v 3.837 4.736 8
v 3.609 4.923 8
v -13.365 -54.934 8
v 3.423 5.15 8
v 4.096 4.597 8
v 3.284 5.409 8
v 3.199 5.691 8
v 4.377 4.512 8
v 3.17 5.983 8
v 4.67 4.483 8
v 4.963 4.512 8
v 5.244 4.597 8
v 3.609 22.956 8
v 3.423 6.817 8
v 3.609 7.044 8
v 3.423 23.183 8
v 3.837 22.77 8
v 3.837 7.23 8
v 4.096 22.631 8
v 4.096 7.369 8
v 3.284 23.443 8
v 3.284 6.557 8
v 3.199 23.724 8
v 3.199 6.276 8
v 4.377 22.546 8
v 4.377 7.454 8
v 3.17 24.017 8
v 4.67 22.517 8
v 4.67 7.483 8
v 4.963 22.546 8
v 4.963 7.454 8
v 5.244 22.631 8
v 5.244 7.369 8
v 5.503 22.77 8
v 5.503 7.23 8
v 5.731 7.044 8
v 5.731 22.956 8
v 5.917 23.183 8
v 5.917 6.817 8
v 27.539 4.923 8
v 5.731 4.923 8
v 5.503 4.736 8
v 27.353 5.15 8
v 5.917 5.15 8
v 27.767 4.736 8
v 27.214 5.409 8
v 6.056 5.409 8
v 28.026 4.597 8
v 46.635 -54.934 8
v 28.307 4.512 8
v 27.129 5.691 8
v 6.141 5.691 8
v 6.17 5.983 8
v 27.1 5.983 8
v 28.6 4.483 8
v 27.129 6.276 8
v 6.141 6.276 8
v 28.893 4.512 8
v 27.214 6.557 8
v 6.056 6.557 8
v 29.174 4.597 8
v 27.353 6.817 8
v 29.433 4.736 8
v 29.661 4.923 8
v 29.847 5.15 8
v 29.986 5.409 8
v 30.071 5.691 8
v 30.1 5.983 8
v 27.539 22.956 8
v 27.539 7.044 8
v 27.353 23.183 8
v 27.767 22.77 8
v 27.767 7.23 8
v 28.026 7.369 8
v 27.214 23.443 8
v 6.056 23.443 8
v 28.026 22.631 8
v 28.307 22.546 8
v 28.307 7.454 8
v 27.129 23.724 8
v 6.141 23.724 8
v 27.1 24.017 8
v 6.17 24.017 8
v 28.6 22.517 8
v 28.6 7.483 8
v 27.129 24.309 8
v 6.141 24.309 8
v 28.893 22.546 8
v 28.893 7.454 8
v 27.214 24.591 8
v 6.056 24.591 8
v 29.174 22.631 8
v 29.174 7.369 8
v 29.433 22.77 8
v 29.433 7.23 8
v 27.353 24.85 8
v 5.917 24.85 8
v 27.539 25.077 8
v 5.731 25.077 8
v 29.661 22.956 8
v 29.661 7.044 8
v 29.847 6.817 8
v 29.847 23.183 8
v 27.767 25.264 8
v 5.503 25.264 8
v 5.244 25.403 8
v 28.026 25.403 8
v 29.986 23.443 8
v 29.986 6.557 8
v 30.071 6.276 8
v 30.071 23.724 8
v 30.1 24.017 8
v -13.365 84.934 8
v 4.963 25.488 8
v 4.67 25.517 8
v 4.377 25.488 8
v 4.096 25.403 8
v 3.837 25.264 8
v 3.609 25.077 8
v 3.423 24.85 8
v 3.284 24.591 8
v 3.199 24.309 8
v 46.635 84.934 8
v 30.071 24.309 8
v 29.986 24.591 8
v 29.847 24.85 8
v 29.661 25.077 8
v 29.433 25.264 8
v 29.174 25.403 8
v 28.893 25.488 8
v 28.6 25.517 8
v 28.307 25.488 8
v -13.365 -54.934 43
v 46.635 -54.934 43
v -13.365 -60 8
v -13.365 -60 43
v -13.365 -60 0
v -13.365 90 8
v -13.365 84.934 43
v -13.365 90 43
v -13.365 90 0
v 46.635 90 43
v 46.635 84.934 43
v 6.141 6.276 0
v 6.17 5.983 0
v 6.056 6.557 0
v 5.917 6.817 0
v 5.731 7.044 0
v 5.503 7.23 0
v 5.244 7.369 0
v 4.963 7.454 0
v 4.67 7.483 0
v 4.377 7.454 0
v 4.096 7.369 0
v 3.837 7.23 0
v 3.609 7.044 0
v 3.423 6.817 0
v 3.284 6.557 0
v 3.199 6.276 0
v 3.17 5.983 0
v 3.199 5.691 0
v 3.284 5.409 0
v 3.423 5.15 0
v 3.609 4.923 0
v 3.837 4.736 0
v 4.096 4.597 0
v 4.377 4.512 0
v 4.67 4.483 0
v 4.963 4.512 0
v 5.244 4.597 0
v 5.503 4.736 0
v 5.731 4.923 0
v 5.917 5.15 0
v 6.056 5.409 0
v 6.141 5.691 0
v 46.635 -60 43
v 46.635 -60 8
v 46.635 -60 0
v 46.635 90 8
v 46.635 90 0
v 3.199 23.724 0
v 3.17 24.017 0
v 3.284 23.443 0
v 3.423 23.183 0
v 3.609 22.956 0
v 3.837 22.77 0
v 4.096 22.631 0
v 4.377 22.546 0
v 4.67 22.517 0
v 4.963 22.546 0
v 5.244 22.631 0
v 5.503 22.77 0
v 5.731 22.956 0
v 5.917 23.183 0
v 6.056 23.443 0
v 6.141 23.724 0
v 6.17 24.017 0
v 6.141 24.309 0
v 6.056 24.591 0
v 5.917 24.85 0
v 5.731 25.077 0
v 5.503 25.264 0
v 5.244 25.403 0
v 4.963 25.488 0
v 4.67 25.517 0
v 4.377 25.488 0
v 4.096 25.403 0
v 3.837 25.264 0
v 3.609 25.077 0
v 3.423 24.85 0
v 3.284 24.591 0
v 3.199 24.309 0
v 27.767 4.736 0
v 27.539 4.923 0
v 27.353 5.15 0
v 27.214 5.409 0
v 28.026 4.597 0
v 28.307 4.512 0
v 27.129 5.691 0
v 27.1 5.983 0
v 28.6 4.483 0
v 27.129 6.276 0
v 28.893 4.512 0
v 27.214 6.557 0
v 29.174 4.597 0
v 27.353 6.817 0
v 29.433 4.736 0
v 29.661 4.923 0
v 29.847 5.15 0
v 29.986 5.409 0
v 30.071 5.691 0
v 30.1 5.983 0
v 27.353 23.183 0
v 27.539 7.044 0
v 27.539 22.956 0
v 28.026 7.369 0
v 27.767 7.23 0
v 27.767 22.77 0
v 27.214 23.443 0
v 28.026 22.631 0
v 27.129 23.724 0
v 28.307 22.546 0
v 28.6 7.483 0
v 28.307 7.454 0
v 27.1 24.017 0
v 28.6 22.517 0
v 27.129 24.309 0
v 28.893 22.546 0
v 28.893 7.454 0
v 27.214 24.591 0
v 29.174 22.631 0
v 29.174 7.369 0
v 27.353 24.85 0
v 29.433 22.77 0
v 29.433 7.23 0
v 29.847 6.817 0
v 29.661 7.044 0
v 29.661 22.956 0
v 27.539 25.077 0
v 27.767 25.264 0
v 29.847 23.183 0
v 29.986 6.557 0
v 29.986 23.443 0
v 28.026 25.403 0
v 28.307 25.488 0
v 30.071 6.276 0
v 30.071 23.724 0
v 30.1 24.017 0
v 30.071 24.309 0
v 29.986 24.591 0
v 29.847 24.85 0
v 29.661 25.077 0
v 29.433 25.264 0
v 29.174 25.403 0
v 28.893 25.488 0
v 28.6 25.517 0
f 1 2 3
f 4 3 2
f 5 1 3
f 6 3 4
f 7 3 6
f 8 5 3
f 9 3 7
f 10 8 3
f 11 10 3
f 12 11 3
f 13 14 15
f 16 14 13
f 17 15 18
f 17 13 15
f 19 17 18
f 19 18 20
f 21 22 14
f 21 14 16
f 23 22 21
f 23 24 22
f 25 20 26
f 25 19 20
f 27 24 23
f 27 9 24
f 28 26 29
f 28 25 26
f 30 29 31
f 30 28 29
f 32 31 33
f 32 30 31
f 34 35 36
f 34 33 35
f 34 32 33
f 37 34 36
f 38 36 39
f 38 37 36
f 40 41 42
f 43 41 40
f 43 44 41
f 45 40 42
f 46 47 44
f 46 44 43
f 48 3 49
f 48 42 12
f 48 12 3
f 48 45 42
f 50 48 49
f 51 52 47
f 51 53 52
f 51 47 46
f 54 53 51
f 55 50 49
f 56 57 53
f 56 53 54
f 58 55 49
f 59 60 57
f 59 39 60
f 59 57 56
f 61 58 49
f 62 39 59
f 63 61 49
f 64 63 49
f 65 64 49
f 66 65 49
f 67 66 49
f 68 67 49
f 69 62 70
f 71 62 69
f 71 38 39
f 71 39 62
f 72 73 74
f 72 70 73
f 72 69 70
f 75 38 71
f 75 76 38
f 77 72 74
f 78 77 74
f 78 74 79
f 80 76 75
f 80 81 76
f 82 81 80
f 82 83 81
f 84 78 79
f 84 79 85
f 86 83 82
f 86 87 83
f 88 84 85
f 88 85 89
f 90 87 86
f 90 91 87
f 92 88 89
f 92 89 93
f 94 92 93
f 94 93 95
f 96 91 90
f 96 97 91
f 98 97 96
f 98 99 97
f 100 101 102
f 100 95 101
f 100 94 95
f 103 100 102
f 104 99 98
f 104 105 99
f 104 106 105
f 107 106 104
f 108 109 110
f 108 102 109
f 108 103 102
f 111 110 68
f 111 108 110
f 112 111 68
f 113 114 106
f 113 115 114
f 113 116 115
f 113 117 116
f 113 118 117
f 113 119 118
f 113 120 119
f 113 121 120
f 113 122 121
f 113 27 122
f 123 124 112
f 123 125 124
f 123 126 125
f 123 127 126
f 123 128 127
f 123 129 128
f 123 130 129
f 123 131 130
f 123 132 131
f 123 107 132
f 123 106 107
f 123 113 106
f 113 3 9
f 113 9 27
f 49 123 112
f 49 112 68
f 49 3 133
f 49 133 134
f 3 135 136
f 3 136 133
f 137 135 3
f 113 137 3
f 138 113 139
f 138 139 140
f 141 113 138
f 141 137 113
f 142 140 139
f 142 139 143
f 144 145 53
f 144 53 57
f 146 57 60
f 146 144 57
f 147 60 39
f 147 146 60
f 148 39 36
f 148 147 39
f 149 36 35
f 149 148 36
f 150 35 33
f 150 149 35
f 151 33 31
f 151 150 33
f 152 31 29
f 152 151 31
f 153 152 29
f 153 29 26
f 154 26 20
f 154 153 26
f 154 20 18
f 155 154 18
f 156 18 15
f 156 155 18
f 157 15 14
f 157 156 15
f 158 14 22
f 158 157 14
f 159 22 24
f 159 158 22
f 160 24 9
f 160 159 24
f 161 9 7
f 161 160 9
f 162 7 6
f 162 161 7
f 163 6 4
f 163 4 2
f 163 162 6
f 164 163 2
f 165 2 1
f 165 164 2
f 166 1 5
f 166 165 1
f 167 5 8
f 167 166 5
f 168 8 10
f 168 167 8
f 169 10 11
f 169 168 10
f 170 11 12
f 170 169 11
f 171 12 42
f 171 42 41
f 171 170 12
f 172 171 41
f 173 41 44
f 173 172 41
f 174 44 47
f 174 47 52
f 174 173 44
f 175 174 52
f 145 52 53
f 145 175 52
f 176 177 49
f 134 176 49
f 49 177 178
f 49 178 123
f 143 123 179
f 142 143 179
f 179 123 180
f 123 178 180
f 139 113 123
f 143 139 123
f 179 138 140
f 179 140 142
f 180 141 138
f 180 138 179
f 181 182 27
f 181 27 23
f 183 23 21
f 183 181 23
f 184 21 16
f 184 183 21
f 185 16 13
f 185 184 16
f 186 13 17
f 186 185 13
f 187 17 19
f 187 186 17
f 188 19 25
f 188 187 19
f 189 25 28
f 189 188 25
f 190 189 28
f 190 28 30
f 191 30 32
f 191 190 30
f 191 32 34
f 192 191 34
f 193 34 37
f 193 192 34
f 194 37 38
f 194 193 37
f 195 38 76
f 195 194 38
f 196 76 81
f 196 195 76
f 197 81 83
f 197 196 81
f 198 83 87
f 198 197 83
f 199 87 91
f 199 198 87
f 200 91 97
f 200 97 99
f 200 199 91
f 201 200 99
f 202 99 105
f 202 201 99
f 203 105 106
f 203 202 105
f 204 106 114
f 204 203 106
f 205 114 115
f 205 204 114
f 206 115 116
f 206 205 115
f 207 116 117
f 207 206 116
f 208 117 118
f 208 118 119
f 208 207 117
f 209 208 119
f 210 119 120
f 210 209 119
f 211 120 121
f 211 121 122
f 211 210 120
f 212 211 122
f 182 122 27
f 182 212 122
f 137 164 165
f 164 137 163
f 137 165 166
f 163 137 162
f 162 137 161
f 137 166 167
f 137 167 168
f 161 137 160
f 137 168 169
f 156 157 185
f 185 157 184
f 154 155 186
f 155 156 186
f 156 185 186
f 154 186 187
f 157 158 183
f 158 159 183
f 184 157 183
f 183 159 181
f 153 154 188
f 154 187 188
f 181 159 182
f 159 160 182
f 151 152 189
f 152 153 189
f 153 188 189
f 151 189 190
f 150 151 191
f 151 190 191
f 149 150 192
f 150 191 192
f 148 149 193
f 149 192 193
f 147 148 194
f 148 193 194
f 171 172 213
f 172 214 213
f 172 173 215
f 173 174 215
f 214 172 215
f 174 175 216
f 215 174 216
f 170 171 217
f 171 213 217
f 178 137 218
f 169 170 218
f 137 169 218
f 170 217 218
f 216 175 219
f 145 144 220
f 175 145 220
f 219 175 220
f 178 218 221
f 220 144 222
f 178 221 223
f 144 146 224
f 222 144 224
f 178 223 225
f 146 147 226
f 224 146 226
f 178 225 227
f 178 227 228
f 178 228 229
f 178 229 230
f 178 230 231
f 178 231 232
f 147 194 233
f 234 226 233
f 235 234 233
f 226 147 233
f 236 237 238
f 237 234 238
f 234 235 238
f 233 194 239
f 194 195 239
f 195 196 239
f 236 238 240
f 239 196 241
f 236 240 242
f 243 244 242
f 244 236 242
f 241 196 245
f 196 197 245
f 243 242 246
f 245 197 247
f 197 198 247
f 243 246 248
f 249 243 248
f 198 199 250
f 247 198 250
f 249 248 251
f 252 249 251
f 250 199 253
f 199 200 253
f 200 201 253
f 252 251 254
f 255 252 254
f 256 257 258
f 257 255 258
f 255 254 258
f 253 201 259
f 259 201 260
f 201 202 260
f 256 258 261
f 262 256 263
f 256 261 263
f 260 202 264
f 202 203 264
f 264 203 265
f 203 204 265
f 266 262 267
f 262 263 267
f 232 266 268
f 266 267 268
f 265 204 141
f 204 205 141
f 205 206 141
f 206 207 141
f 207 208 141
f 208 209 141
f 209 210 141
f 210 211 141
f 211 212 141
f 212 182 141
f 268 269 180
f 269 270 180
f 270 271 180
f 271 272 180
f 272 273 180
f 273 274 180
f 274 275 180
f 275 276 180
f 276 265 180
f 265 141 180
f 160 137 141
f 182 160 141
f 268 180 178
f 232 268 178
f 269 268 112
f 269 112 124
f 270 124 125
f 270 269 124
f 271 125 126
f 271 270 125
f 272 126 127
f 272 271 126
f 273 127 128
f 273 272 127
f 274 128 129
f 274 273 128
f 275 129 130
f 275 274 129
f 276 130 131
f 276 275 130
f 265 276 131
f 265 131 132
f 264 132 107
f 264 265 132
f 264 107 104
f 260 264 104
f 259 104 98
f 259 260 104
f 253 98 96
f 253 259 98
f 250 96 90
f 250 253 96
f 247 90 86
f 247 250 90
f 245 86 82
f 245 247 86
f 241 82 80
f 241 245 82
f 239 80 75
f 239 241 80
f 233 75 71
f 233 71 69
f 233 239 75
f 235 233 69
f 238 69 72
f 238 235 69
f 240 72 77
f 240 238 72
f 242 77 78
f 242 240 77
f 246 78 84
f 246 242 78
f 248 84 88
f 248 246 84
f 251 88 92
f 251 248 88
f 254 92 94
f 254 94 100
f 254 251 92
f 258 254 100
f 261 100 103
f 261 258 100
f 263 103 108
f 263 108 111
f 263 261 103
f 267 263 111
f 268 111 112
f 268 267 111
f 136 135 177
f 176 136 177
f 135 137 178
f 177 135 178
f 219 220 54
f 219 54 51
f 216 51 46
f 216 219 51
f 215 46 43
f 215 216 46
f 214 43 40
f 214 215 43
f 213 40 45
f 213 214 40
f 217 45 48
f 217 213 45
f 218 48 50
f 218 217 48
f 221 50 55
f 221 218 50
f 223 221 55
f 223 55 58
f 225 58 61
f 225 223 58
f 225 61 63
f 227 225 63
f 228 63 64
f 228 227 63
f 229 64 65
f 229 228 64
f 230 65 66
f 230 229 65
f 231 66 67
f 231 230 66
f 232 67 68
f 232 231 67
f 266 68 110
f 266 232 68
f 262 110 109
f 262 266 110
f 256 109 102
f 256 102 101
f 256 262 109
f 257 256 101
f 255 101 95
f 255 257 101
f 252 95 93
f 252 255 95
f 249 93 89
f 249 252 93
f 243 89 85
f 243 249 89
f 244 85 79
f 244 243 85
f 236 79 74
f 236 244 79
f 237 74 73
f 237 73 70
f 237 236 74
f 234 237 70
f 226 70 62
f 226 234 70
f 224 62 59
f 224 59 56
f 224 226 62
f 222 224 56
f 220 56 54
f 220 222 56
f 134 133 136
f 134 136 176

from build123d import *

# Parameters (mm, degrees)
SKETCH2_W           = 60
SKETCH2_H           = 150
SKETCH2_R           = 1.5
BOSS_EXTRUDE1_DEPTH = 8
SKETCH5_W           = 60
SKETCH5_H           = 5.066428815
BOSS_EXTRUDE2_DEPTH = 35


with BuildPart() as part:
    # Sketch2 → Boss-Extrude1 (new body)
    with BuildSketch(Plane.XY):
        with Locations((16.635, 15)):
            Rectangle(SKETCH2_W, SKETCH2_H)
        with Locations((28.6, 24.016821687)):
            Circle(SKETCH2_R, mode=Mode.SUBTRACT)
        with Locations(Location((28.6, 5.983178313, 0), (0, 0, 180))):
            Circle(SKETCH2_R, mode=Mode.SUBTRACT)
        with Locations((4.67, 5.983178313)):
            Circle(SKETCH2_R, mode=Mode.SUBTRACT)
        with Locations(Location((4.67, 24.016821687, 0), (0, 0, 180))):
            Circle(SKETCH2_R, mode=Mode.SUBTRACT)
    extrude(amount=BOSS_EXTRUDE1_DEPTH)

    # Sketch5 → Boss-Extrude2 (add)
    with BuildSketch(Plane.XY.offset(8)):
        with Locations((16.635, 87.466785593)):
            Rectangle(SKETCH5_W, SKETCH5_H)
        with Locations((16.635, -57.466785593)):
            Rectangle(SKETCH5_W, SKETCH5_H)
    extrude(amount=BOSS_EXTRUDE2_DEPTH)


solid = part.part
